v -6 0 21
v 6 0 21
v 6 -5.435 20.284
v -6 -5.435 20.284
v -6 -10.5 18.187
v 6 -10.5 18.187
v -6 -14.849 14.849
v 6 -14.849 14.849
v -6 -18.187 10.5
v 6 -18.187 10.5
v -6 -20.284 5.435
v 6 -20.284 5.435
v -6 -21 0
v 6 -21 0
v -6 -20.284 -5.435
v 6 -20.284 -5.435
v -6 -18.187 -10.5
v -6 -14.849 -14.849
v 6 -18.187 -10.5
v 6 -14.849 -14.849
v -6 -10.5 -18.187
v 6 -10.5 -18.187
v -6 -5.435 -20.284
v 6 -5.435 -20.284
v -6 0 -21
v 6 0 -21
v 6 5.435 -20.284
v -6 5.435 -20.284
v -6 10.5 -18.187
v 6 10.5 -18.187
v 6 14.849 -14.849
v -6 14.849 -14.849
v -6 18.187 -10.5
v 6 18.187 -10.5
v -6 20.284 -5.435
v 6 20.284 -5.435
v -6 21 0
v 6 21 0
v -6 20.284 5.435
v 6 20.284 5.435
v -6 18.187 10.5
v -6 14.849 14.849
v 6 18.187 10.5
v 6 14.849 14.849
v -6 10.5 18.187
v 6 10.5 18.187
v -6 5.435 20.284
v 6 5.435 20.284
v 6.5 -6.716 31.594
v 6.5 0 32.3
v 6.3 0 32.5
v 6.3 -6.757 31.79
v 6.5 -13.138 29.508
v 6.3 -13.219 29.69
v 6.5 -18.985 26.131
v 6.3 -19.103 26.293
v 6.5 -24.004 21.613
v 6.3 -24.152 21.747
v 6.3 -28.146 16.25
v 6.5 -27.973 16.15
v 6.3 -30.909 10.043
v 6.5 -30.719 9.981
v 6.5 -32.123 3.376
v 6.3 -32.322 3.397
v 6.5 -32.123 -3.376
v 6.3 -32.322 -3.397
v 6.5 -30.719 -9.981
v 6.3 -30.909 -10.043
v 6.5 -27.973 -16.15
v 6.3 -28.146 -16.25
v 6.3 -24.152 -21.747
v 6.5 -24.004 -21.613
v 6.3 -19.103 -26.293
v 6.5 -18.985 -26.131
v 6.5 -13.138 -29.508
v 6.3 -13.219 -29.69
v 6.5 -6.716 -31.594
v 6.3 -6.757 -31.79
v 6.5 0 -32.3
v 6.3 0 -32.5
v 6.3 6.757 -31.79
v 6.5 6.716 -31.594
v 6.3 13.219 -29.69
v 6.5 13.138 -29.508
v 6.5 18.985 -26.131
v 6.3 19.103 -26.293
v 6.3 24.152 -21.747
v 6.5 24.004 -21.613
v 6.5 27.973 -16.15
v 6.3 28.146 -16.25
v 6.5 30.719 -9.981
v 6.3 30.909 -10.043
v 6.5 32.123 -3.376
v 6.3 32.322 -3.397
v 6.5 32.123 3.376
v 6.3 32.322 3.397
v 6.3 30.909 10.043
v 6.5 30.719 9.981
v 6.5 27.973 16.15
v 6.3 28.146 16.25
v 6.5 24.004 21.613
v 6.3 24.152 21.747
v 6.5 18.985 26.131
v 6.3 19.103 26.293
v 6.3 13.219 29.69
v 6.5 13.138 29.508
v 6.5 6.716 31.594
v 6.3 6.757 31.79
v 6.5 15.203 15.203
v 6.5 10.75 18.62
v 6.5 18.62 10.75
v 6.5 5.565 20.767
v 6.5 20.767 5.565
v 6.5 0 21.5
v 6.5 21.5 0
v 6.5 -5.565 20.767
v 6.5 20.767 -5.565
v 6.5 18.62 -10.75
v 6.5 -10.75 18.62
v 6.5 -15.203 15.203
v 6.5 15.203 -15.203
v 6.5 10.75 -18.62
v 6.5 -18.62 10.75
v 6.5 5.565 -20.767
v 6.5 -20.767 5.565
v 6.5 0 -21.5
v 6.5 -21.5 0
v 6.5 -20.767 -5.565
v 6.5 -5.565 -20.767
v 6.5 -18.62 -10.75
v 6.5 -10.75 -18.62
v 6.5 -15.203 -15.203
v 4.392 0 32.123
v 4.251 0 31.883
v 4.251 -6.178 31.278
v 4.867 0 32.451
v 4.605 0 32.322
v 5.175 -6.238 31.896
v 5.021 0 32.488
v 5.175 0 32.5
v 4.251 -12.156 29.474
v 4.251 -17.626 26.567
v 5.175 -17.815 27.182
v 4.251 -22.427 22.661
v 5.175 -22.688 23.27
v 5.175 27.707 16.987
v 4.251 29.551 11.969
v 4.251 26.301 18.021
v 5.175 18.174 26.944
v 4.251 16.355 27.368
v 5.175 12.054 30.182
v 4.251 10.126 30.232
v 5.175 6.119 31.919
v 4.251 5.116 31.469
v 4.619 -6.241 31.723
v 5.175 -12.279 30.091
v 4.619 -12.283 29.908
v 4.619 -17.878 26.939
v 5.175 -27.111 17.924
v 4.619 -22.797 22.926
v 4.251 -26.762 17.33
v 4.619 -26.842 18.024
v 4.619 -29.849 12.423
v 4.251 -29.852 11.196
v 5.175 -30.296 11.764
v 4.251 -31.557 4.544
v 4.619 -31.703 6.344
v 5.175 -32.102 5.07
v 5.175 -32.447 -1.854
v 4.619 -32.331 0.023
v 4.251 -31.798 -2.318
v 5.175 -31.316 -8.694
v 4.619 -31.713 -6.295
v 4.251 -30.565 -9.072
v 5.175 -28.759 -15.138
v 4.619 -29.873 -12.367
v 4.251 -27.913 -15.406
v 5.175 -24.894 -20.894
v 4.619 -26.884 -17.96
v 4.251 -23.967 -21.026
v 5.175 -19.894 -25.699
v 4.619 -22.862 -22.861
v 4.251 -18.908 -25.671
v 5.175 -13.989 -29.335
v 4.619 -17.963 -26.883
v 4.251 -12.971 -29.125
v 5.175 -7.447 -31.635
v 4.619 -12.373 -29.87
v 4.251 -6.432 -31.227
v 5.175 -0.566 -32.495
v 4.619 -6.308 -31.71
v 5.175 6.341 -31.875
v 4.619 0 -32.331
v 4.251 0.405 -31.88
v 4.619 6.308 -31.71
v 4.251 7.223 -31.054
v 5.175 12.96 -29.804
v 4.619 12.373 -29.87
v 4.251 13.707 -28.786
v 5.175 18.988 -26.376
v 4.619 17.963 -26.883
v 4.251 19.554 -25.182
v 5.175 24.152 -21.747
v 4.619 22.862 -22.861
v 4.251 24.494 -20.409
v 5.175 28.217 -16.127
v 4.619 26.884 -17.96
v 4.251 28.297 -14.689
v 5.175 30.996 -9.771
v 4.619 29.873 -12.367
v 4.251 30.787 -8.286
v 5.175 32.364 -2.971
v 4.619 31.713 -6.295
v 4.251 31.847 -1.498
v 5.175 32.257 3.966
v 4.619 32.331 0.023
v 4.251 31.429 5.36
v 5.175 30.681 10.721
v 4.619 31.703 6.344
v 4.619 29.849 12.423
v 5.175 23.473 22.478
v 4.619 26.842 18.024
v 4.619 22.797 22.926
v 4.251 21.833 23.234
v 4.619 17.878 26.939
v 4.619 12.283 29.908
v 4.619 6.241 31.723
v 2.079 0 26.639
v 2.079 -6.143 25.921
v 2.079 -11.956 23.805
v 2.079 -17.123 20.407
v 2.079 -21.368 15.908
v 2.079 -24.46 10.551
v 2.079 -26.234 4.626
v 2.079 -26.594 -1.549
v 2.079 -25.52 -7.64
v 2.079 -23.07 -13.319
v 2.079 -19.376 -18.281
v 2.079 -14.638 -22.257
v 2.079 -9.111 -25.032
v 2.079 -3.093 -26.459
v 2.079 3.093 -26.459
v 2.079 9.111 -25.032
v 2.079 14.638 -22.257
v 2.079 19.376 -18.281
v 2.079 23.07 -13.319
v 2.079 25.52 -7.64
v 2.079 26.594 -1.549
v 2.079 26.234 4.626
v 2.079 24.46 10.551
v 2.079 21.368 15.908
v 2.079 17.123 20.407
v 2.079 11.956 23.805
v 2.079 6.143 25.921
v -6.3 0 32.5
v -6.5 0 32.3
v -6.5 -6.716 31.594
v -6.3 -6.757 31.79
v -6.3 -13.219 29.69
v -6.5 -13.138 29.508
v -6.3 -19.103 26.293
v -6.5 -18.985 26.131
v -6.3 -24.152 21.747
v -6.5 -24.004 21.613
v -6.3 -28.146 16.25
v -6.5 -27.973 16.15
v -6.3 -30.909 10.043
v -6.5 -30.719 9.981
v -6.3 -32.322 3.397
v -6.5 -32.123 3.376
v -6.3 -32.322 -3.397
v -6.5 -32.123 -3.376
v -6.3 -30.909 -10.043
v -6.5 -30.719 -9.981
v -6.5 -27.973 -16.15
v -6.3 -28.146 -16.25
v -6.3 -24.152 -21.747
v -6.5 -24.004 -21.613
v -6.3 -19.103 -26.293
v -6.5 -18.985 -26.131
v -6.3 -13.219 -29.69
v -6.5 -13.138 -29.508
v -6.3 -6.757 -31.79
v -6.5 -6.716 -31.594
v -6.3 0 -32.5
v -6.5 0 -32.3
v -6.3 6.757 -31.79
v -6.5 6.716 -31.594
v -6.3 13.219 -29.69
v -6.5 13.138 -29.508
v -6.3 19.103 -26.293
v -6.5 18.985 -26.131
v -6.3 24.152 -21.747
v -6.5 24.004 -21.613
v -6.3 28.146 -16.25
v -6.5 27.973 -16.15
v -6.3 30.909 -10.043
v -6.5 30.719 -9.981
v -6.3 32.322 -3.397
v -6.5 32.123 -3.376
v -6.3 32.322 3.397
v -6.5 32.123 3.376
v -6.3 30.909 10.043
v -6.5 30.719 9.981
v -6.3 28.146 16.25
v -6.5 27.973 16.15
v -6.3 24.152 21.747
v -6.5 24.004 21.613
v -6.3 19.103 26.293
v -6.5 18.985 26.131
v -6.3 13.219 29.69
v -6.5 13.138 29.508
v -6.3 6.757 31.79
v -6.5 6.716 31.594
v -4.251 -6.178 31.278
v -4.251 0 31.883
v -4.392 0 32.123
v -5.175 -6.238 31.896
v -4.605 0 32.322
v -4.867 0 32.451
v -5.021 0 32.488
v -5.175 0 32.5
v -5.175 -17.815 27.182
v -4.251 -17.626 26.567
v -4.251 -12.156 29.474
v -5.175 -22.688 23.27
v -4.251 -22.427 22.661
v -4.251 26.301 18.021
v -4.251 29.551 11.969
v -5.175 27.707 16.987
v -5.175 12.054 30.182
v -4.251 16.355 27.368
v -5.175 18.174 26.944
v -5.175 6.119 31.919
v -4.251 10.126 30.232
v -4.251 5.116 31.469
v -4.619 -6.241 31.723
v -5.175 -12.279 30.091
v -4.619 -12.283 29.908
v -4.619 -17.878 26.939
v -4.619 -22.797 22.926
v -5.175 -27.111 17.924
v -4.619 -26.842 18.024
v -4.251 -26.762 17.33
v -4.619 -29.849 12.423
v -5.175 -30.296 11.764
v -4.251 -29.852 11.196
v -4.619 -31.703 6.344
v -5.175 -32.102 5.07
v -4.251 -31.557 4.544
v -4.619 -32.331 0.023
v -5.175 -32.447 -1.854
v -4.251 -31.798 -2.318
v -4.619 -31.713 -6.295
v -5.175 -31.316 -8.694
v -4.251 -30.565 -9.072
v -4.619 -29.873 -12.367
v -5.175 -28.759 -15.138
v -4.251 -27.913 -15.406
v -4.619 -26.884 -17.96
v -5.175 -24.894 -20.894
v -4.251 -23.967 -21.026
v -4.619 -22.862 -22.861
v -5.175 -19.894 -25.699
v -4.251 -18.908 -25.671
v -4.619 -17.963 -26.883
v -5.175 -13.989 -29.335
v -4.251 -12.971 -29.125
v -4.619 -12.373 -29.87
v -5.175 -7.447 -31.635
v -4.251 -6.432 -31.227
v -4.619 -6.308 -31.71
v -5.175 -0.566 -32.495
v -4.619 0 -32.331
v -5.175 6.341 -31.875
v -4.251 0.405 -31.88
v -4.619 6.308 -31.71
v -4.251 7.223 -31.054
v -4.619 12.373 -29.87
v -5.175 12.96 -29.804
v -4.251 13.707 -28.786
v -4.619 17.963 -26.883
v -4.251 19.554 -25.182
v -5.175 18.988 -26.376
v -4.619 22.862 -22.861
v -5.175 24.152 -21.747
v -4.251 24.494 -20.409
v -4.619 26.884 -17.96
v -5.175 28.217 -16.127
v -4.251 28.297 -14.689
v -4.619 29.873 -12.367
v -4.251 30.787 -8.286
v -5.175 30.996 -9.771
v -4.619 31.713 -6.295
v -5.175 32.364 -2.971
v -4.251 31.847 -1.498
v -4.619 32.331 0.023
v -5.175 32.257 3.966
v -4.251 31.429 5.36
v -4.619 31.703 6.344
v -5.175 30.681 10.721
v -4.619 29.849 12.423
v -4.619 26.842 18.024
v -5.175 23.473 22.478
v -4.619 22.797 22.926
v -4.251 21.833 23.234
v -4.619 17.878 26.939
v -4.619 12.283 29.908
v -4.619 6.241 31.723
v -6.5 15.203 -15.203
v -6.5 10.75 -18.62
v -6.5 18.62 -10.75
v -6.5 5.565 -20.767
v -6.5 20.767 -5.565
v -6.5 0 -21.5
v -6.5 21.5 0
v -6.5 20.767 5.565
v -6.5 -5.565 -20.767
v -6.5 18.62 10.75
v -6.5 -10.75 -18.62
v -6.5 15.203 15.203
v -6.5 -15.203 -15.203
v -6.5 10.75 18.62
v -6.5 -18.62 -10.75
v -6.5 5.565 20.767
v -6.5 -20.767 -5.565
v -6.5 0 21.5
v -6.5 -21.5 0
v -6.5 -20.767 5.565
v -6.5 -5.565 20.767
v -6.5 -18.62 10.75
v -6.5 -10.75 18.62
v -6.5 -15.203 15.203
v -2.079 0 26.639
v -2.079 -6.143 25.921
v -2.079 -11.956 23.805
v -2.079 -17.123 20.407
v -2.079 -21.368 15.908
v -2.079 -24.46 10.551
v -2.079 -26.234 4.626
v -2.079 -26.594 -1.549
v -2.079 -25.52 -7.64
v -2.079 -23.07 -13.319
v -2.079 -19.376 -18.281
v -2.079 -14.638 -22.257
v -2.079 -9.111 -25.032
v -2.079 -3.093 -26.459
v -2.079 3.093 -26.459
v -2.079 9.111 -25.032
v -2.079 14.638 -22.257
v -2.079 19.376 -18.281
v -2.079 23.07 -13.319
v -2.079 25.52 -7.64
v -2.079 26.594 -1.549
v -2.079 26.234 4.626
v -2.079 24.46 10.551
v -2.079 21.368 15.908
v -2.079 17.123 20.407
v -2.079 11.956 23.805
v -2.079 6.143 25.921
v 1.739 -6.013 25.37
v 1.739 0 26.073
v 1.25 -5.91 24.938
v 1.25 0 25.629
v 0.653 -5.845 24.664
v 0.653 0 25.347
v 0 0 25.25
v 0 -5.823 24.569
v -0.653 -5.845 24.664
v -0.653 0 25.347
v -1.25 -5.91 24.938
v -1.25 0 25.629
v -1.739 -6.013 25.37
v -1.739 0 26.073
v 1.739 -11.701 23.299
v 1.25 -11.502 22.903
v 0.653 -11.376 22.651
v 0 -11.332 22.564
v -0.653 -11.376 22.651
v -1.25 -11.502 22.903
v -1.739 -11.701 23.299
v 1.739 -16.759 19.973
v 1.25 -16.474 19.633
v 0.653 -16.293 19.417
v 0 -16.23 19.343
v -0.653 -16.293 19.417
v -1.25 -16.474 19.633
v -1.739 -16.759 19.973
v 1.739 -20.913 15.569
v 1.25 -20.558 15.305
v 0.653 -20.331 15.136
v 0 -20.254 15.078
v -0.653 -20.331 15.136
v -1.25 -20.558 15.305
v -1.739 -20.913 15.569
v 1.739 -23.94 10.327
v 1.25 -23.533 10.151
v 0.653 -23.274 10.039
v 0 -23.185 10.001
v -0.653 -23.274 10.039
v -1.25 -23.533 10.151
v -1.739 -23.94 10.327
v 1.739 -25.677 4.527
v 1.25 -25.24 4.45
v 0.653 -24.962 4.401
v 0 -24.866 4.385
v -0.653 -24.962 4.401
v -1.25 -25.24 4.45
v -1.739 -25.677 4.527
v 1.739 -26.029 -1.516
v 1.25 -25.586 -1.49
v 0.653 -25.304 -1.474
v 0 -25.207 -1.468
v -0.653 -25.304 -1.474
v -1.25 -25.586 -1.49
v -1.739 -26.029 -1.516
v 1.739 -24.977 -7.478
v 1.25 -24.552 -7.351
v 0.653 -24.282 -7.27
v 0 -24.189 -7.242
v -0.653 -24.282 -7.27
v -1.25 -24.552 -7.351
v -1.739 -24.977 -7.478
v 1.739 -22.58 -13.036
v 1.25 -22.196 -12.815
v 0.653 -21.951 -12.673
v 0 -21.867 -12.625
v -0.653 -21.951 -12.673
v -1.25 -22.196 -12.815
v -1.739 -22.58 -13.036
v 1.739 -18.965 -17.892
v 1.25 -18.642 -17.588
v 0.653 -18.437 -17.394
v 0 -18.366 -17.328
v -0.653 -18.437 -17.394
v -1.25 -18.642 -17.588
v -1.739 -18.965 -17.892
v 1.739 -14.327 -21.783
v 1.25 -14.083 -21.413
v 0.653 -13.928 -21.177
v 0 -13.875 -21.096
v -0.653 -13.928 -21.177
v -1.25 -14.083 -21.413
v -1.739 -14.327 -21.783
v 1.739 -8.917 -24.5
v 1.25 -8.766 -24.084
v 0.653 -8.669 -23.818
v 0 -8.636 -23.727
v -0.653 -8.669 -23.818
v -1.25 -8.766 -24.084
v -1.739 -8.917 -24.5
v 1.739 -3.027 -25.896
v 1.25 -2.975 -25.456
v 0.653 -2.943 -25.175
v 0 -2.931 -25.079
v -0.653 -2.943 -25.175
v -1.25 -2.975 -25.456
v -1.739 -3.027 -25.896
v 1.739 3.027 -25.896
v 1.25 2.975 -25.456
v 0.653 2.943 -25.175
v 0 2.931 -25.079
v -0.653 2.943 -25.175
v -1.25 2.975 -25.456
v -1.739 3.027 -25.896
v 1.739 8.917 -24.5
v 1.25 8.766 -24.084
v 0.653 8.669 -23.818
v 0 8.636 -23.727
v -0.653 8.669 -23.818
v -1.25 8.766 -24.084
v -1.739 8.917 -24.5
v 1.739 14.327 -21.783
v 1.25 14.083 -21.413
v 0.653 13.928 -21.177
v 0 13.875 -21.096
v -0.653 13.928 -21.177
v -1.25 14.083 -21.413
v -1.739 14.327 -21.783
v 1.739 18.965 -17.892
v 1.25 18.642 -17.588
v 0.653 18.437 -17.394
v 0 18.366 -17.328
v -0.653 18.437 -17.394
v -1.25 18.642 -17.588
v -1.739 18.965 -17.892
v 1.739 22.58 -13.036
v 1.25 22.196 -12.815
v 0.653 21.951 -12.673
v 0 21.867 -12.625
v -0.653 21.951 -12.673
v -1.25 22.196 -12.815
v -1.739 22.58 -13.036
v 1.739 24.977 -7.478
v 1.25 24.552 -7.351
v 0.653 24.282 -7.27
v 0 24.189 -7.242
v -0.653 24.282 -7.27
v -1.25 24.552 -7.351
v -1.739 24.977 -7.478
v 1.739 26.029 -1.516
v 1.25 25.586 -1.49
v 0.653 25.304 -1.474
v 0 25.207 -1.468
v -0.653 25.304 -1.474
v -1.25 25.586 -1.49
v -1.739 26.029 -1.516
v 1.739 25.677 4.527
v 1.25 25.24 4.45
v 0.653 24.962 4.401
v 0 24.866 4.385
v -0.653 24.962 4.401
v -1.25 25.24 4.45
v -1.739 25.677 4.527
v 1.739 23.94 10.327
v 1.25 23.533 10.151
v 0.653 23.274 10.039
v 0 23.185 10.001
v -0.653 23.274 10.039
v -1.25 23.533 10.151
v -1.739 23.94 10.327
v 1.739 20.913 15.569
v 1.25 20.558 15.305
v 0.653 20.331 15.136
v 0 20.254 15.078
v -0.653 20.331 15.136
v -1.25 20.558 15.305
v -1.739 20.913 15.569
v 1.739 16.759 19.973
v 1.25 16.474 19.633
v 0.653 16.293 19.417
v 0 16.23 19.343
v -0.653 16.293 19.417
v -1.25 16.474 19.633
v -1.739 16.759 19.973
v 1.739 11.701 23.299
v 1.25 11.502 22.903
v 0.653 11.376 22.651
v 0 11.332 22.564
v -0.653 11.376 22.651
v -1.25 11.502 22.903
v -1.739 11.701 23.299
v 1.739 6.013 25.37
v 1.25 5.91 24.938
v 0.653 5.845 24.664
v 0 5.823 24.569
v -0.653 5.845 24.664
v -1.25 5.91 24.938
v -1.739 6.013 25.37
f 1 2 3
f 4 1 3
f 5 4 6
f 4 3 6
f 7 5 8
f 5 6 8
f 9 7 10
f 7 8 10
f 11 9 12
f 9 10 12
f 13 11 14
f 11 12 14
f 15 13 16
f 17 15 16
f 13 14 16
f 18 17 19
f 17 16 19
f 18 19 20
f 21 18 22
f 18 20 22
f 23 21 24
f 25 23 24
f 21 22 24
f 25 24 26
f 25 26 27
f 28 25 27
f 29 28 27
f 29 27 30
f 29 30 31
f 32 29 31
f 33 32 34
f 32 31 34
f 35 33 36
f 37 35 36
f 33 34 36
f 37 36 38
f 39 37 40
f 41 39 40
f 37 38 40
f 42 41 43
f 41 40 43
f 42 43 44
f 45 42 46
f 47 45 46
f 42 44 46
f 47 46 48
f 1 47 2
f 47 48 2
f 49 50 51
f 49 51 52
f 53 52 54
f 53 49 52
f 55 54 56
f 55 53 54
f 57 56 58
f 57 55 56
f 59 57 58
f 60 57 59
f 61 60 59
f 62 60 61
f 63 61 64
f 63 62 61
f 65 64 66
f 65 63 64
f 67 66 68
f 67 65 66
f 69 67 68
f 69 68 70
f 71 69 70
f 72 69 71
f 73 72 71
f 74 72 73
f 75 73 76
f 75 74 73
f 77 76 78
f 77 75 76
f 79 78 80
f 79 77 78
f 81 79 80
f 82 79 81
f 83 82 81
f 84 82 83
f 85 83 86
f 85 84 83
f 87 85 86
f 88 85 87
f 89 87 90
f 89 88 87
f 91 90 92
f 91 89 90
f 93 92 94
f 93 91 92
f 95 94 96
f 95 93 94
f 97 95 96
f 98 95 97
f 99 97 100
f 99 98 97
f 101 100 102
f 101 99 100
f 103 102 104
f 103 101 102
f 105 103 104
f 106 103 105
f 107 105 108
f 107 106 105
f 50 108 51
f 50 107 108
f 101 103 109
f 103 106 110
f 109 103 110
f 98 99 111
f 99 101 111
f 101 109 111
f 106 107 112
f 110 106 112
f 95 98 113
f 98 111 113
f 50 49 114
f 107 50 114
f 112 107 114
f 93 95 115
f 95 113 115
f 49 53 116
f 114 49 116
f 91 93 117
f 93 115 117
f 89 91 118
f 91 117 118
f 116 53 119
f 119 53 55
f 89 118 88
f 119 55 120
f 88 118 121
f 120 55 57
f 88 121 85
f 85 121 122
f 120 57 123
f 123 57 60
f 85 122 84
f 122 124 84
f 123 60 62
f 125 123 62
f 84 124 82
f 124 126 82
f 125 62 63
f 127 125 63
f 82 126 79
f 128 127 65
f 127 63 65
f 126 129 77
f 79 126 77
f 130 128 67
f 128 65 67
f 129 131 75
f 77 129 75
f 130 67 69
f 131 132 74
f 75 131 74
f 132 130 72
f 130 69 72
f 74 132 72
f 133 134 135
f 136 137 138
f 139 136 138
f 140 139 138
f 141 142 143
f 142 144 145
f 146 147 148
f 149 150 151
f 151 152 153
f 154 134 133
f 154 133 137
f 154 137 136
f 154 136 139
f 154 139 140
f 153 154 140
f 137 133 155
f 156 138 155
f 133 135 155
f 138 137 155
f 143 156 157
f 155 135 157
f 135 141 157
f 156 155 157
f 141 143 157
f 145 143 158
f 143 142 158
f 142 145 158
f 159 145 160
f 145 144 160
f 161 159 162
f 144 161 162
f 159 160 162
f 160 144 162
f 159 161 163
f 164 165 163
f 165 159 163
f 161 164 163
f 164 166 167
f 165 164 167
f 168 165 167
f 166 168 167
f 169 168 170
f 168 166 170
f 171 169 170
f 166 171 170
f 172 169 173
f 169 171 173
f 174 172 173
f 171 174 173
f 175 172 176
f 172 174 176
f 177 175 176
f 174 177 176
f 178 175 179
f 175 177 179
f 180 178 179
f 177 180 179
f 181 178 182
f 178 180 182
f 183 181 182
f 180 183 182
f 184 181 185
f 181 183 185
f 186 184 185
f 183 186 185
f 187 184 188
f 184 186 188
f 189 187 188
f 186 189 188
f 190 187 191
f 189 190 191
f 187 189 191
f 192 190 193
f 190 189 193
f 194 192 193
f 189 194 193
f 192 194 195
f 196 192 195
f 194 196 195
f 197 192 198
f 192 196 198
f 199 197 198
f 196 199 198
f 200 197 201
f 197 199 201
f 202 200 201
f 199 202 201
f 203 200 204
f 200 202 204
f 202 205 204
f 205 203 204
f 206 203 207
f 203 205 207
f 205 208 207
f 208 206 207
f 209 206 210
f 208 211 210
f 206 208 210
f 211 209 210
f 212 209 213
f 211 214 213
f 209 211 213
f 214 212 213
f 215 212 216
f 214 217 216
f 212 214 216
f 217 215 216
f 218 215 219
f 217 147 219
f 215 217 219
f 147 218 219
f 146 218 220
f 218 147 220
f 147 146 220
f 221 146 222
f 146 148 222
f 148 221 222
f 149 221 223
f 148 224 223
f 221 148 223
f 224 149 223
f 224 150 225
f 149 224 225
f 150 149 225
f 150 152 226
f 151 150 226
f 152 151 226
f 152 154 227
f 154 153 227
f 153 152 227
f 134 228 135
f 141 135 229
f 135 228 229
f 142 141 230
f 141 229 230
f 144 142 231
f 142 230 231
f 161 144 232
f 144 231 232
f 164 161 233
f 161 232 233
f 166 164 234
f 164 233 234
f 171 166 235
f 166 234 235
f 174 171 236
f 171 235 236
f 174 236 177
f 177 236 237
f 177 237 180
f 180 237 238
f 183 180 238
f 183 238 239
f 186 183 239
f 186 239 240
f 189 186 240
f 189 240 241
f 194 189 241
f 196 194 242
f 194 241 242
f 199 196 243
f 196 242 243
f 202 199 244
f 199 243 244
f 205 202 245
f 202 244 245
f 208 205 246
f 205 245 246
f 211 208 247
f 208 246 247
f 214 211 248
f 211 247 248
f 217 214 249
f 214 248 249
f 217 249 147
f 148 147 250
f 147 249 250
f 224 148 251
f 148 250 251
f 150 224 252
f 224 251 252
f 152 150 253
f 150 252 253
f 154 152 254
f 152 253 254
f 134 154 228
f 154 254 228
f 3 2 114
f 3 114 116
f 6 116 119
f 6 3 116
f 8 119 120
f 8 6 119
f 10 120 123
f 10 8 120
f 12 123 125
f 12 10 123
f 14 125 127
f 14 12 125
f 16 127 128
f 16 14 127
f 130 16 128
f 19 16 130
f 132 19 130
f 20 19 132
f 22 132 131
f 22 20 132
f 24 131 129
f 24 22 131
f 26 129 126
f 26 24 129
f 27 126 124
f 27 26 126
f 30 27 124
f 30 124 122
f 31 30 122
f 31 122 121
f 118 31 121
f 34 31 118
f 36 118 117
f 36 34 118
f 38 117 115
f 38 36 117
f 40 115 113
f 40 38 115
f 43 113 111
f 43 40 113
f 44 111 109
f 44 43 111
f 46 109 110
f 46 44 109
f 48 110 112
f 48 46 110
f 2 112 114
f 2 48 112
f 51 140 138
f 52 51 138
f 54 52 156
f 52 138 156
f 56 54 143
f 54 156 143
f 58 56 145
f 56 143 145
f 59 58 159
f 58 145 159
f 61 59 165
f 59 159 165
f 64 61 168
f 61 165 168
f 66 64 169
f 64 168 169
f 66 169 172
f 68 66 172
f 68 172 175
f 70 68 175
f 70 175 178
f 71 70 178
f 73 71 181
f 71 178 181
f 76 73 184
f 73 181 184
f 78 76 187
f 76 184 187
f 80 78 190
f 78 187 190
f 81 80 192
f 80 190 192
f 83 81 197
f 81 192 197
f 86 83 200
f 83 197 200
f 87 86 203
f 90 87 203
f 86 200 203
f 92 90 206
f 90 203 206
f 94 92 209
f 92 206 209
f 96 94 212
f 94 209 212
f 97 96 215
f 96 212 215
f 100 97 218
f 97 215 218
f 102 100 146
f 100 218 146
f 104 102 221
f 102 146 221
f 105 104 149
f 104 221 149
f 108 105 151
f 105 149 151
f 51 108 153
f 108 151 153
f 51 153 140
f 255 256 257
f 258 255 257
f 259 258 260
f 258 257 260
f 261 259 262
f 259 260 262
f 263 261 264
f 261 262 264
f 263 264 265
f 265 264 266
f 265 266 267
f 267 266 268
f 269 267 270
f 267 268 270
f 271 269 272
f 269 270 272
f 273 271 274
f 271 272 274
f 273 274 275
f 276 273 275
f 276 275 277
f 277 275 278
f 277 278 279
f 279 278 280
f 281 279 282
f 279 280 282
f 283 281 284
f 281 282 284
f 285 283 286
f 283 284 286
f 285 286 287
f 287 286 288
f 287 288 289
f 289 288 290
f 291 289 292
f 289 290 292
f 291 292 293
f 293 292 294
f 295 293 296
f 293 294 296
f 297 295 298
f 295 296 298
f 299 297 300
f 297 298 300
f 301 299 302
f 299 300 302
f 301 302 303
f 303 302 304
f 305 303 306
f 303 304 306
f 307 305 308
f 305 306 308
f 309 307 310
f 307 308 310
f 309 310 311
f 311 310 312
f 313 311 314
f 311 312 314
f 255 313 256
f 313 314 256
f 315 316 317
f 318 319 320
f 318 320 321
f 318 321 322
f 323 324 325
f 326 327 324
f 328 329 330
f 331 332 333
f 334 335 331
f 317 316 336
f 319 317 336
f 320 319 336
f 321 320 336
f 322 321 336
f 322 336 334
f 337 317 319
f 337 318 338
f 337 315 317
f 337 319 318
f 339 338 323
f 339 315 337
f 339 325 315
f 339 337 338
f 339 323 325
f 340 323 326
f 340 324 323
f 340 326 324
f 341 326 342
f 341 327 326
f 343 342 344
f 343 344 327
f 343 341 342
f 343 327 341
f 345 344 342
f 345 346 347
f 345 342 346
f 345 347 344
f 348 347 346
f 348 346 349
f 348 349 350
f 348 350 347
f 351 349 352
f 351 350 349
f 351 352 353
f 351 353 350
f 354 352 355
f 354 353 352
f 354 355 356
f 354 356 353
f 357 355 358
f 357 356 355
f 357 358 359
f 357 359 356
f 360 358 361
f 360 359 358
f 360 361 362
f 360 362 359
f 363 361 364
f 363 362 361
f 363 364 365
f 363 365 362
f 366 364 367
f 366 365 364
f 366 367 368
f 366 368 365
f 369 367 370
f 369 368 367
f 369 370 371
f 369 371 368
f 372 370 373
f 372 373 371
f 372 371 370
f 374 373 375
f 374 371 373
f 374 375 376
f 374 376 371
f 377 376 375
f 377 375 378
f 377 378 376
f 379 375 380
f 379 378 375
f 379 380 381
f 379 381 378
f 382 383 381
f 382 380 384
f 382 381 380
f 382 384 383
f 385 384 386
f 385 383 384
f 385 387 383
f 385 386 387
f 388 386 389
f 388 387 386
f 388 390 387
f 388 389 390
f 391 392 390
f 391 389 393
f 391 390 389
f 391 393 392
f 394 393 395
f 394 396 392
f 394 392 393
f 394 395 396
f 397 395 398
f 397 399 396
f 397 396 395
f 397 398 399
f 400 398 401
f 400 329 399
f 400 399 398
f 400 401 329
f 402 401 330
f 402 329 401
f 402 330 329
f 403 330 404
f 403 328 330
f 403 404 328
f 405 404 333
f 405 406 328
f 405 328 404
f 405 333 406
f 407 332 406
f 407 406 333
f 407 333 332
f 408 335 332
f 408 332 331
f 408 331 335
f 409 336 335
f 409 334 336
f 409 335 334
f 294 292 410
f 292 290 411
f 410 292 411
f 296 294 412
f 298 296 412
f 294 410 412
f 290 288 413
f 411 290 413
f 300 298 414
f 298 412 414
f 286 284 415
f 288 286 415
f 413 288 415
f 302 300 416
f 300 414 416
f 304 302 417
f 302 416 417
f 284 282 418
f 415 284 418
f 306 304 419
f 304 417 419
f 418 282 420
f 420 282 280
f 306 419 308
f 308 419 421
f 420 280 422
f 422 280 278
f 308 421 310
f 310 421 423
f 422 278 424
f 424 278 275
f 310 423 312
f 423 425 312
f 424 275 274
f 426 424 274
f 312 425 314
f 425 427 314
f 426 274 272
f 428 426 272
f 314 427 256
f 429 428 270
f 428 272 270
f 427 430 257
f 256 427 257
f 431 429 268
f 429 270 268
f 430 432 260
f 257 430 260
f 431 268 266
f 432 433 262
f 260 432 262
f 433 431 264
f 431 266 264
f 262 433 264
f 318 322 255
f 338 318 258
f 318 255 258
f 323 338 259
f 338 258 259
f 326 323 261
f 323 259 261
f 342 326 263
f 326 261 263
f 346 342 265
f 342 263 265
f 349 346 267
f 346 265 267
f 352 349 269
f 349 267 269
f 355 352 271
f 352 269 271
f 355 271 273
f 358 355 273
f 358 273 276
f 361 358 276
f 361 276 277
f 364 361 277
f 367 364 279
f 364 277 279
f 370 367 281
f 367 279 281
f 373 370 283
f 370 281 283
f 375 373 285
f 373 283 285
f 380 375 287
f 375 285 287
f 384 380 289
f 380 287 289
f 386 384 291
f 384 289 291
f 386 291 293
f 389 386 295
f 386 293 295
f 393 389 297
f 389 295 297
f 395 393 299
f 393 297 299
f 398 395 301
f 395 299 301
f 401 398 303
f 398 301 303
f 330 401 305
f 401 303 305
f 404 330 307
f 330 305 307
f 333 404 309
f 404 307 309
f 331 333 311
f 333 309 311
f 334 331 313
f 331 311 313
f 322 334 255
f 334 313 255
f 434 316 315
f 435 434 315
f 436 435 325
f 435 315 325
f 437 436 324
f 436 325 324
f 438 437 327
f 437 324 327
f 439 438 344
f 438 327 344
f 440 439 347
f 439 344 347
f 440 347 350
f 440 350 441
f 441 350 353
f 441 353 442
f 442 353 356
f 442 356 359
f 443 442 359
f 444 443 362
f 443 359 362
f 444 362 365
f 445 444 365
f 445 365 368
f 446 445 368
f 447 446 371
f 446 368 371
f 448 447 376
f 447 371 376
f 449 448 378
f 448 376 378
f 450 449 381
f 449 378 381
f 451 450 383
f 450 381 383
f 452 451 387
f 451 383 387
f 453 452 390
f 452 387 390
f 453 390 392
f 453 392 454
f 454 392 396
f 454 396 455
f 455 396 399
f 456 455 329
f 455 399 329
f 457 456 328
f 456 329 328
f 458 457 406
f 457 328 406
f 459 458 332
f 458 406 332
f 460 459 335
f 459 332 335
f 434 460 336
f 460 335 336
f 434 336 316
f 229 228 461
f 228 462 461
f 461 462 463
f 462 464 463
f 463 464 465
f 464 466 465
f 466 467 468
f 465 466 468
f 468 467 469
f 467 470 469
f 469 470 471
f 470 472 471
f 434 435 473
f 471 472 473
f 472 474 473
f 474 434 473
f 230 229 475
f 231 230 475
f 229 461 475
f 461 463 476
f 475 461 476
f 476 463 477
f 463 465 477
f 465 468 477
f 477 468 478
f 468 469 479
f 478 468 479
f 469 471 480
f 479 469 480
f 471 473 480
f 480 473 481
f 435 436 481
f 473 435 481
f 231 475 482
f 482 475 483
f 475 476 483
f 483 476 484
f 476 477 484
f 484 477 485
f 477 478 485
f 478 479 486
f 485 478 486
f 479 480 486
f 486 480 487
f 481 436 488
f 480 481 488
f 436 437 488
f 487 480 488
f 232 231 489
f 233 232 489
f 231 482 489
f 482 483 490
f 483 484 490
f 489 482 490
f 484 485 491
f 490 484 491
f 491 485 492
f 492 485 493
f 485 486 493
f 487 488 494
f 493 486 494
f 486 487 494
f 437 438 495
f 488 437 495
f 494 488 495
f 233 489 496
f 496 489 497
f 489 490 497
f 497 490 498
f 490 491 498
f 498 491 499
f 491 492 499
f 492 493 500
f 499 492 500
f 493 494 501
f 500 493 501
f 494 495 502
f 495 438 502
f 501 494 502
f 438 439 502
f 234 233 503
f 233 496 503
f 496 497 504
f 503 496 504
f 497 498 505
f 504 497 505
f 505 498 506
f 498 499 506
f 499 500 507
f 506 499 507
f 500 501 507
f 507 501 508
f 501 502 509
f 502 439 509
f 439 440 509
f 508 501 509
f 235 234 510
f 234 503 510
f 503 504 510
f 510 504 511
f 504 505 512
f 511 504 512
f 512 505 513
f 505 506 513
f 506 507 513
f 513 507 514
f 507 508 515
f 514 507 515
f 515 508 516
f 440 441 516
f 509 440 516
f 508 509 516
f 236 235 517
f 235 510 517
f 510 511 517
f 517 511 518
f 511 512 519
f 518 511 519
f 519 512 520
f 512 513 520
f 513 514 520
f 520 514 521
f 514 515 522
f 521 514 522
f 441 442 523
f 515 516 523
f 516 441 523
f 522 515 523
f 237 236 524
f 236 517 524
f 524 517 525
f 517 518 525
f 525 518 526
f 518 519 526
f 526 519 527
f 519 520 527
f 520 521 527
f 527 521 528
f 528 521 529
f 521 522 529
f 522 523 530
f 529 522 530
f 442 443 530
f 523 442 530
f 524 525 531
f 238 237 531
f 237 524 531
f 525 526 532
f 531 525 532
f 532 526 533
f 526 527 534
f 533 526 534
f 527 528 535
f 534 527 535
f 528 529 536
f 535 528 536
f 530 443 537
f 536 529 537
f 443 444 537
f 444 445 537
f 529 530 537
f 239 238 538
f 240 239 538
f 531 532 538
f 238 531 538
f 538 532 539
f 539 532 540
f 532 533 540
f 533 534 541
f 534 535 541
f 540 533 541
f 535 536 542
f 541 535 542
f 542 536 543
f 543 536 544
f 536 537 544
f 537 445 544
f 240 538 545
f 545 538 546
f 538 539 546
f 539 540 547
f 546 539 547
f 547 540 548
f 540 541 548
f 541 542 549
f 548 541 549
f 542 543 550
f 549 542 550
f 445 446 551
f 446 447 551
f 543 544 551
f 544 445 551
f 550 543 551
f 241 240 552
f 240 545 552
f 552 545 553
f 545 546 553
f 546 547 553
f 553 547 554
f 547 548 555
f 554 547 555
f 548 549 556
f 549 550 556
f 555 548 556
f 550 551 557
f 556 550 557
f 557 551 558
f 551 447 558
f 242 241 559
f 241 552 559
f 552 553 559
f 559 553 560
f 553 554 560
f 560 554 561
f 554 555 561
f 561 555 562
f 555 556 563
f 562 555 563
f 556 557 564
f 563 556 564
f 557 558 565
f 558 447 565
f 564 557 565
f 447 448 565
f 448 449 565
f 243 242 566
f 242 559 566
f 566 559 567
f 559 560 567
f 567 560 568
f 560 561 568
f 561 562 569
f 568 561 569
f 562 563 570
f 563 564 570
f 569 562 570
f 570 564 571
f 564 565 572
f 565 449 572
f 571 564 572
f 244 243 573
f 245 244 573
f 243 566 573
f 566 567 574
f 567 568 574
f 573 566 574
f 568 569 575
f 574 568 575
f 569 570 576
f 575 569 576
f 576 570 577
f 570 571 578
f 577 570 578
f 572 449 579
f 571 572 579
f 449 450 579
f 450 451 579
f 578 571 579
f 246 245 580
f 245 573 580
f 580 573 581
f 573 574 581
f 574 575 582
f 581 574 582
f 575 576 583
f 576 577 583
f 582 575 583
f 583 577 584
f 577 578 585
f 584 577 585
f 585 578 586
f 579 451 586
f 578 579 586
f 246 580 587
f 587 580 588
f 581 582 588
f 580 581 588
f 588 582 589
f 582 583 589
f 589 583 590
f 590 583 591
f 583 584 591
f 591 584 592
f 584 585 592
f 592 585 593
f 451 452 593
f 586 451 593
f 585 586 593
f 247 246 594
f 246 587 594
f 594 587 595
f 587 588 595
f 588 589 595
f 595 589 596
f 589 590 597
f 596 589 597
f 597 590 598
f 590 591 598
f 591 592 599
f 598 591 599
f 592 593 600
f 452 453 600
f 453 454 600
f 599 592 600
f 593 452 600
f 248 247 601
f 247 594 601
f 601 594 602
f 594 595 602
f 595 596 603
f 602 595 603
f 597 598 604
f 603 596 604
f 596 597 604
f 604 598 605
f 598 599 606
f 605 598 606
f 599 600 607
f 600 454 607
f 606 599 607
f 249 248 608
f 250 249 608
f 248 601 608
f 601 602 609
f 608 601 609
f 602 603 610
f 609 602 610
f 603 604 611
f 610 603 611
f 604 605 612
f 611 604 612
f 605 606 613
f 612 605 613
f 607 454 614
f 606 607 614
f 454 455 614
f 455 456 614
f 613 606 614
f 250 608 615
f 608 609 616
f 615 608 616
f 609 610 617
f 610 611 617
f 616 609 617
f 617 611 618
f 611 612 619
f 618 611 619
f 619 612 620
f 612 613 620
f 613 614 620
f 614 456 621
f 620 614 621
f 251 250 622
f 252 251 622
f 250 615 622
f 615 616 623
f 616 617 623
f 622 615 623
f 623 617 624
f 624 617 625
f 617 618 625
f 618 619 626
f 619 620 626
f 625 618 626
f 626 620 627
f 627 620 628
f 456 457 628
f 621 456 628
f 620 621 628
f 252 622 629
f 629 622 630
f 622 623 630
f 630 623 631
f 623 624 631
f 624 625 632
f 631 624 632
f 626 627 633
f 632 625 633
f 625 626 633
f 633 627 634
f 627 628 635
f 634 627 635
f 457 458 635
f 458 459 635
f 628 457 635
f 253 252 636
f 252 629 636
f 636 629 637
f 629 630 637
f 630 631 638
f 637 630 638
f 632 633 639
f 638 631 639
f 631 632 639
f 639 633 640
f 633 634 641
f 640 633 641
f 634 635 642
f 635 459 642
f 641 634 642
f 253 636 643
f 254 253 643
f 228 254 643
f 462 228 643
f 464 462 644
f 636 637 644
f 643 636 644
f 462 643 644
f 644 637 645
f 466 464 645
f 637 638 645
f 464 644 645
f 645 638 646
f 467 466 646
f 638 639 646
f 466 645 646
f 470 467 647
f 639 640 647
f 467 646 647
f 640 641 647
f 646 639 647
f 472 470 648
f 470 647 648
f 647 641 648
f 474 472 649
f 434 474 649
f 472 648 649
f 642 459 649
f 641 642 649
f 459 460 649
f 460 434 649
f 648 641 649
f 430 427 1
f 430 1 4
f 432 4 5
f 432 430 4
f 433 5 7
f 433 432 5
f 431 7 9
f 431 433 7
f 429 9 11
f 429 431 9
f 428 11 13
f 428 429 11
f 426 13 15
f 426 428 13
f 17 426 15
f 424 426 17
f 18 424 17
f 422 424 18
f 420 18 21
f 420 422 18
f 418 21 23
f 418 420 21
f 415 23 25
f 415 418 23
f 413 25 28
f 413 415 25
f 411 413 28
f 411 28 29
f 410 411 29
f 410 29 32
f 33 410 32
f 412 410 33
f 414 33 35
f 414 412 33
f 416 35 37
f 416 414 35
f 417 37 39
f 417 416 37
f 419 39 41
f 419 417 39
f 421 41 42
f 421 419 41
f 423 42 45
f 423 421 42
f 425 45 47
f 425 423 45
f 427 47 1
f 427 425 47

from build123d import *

# Parameters (mm, degrees)
FILETE2_R     = 1
CHANFRO2_SIZE = 0.2
CHANFRO3_SIZE = 0.5


with BuildPart() as part:
    # Esboço1 → Revolução1 (revolve)
    with BuildSketch(Plane.XY, mode=Mode.PRIVATE) as revolu_o1_sk:
        with BuildLine():
            Line((4.506450263, 32.5), (2.078728948, 26.638962277))
            ThreePointArc((2.078728948, 26.638962277), (0, 25.25), (-2.078728948, 26.638962277))
            Line((-2.078728948, 26.638962277), (-4.506450263, 32.5))
            Line((-4.506450263, 32.5), (-6.5, 32.5))
            Line((-6.5, 32.5), (-6.5, 21))
            Line((-6.5, 21), (6.5, 21))
            Line((6.5, 21), (6.5, 32.5))
            Line((6.5, 32.5), (4.506450263, 32.5))
        make_face()
    revolve(revolu_o1_sk.sketch.rotate(Axis((0, 0, 0), (1, 0, 0)), 90), axis=Axis((0, 0, 0), (1, 0, 0)))

    # Filete2
    filete2_edges = [part.edges().sort_by_distance(p)[0] for p in [
        (-4.506450263, 0, -32.5),
        (4.506450263, 0, -32.5),
    ]]
    fillet(filete2_edges, radius=FILETE2_R)

    # Chanfro2
    chanfro2_edges = [part.edges().sort_by_distance(p)[0] for p in [
        (6.5, 0, -32.5),
        (-6.5, 0, -32.5),
    ]]
    chamfer(chanfro2_edges, length=CHANFRO2_SIZE)

    # Chanfro3
    chanfro3_edges = [part.edges().sort_by_distance(p)[0] for p in [
        (6.5, 0, -21),
        (-6.5, 0, -21),
    ]]
    chamfer(chanfro3_edges, length=CHANFRO3_SIZE)


solid = part.part
